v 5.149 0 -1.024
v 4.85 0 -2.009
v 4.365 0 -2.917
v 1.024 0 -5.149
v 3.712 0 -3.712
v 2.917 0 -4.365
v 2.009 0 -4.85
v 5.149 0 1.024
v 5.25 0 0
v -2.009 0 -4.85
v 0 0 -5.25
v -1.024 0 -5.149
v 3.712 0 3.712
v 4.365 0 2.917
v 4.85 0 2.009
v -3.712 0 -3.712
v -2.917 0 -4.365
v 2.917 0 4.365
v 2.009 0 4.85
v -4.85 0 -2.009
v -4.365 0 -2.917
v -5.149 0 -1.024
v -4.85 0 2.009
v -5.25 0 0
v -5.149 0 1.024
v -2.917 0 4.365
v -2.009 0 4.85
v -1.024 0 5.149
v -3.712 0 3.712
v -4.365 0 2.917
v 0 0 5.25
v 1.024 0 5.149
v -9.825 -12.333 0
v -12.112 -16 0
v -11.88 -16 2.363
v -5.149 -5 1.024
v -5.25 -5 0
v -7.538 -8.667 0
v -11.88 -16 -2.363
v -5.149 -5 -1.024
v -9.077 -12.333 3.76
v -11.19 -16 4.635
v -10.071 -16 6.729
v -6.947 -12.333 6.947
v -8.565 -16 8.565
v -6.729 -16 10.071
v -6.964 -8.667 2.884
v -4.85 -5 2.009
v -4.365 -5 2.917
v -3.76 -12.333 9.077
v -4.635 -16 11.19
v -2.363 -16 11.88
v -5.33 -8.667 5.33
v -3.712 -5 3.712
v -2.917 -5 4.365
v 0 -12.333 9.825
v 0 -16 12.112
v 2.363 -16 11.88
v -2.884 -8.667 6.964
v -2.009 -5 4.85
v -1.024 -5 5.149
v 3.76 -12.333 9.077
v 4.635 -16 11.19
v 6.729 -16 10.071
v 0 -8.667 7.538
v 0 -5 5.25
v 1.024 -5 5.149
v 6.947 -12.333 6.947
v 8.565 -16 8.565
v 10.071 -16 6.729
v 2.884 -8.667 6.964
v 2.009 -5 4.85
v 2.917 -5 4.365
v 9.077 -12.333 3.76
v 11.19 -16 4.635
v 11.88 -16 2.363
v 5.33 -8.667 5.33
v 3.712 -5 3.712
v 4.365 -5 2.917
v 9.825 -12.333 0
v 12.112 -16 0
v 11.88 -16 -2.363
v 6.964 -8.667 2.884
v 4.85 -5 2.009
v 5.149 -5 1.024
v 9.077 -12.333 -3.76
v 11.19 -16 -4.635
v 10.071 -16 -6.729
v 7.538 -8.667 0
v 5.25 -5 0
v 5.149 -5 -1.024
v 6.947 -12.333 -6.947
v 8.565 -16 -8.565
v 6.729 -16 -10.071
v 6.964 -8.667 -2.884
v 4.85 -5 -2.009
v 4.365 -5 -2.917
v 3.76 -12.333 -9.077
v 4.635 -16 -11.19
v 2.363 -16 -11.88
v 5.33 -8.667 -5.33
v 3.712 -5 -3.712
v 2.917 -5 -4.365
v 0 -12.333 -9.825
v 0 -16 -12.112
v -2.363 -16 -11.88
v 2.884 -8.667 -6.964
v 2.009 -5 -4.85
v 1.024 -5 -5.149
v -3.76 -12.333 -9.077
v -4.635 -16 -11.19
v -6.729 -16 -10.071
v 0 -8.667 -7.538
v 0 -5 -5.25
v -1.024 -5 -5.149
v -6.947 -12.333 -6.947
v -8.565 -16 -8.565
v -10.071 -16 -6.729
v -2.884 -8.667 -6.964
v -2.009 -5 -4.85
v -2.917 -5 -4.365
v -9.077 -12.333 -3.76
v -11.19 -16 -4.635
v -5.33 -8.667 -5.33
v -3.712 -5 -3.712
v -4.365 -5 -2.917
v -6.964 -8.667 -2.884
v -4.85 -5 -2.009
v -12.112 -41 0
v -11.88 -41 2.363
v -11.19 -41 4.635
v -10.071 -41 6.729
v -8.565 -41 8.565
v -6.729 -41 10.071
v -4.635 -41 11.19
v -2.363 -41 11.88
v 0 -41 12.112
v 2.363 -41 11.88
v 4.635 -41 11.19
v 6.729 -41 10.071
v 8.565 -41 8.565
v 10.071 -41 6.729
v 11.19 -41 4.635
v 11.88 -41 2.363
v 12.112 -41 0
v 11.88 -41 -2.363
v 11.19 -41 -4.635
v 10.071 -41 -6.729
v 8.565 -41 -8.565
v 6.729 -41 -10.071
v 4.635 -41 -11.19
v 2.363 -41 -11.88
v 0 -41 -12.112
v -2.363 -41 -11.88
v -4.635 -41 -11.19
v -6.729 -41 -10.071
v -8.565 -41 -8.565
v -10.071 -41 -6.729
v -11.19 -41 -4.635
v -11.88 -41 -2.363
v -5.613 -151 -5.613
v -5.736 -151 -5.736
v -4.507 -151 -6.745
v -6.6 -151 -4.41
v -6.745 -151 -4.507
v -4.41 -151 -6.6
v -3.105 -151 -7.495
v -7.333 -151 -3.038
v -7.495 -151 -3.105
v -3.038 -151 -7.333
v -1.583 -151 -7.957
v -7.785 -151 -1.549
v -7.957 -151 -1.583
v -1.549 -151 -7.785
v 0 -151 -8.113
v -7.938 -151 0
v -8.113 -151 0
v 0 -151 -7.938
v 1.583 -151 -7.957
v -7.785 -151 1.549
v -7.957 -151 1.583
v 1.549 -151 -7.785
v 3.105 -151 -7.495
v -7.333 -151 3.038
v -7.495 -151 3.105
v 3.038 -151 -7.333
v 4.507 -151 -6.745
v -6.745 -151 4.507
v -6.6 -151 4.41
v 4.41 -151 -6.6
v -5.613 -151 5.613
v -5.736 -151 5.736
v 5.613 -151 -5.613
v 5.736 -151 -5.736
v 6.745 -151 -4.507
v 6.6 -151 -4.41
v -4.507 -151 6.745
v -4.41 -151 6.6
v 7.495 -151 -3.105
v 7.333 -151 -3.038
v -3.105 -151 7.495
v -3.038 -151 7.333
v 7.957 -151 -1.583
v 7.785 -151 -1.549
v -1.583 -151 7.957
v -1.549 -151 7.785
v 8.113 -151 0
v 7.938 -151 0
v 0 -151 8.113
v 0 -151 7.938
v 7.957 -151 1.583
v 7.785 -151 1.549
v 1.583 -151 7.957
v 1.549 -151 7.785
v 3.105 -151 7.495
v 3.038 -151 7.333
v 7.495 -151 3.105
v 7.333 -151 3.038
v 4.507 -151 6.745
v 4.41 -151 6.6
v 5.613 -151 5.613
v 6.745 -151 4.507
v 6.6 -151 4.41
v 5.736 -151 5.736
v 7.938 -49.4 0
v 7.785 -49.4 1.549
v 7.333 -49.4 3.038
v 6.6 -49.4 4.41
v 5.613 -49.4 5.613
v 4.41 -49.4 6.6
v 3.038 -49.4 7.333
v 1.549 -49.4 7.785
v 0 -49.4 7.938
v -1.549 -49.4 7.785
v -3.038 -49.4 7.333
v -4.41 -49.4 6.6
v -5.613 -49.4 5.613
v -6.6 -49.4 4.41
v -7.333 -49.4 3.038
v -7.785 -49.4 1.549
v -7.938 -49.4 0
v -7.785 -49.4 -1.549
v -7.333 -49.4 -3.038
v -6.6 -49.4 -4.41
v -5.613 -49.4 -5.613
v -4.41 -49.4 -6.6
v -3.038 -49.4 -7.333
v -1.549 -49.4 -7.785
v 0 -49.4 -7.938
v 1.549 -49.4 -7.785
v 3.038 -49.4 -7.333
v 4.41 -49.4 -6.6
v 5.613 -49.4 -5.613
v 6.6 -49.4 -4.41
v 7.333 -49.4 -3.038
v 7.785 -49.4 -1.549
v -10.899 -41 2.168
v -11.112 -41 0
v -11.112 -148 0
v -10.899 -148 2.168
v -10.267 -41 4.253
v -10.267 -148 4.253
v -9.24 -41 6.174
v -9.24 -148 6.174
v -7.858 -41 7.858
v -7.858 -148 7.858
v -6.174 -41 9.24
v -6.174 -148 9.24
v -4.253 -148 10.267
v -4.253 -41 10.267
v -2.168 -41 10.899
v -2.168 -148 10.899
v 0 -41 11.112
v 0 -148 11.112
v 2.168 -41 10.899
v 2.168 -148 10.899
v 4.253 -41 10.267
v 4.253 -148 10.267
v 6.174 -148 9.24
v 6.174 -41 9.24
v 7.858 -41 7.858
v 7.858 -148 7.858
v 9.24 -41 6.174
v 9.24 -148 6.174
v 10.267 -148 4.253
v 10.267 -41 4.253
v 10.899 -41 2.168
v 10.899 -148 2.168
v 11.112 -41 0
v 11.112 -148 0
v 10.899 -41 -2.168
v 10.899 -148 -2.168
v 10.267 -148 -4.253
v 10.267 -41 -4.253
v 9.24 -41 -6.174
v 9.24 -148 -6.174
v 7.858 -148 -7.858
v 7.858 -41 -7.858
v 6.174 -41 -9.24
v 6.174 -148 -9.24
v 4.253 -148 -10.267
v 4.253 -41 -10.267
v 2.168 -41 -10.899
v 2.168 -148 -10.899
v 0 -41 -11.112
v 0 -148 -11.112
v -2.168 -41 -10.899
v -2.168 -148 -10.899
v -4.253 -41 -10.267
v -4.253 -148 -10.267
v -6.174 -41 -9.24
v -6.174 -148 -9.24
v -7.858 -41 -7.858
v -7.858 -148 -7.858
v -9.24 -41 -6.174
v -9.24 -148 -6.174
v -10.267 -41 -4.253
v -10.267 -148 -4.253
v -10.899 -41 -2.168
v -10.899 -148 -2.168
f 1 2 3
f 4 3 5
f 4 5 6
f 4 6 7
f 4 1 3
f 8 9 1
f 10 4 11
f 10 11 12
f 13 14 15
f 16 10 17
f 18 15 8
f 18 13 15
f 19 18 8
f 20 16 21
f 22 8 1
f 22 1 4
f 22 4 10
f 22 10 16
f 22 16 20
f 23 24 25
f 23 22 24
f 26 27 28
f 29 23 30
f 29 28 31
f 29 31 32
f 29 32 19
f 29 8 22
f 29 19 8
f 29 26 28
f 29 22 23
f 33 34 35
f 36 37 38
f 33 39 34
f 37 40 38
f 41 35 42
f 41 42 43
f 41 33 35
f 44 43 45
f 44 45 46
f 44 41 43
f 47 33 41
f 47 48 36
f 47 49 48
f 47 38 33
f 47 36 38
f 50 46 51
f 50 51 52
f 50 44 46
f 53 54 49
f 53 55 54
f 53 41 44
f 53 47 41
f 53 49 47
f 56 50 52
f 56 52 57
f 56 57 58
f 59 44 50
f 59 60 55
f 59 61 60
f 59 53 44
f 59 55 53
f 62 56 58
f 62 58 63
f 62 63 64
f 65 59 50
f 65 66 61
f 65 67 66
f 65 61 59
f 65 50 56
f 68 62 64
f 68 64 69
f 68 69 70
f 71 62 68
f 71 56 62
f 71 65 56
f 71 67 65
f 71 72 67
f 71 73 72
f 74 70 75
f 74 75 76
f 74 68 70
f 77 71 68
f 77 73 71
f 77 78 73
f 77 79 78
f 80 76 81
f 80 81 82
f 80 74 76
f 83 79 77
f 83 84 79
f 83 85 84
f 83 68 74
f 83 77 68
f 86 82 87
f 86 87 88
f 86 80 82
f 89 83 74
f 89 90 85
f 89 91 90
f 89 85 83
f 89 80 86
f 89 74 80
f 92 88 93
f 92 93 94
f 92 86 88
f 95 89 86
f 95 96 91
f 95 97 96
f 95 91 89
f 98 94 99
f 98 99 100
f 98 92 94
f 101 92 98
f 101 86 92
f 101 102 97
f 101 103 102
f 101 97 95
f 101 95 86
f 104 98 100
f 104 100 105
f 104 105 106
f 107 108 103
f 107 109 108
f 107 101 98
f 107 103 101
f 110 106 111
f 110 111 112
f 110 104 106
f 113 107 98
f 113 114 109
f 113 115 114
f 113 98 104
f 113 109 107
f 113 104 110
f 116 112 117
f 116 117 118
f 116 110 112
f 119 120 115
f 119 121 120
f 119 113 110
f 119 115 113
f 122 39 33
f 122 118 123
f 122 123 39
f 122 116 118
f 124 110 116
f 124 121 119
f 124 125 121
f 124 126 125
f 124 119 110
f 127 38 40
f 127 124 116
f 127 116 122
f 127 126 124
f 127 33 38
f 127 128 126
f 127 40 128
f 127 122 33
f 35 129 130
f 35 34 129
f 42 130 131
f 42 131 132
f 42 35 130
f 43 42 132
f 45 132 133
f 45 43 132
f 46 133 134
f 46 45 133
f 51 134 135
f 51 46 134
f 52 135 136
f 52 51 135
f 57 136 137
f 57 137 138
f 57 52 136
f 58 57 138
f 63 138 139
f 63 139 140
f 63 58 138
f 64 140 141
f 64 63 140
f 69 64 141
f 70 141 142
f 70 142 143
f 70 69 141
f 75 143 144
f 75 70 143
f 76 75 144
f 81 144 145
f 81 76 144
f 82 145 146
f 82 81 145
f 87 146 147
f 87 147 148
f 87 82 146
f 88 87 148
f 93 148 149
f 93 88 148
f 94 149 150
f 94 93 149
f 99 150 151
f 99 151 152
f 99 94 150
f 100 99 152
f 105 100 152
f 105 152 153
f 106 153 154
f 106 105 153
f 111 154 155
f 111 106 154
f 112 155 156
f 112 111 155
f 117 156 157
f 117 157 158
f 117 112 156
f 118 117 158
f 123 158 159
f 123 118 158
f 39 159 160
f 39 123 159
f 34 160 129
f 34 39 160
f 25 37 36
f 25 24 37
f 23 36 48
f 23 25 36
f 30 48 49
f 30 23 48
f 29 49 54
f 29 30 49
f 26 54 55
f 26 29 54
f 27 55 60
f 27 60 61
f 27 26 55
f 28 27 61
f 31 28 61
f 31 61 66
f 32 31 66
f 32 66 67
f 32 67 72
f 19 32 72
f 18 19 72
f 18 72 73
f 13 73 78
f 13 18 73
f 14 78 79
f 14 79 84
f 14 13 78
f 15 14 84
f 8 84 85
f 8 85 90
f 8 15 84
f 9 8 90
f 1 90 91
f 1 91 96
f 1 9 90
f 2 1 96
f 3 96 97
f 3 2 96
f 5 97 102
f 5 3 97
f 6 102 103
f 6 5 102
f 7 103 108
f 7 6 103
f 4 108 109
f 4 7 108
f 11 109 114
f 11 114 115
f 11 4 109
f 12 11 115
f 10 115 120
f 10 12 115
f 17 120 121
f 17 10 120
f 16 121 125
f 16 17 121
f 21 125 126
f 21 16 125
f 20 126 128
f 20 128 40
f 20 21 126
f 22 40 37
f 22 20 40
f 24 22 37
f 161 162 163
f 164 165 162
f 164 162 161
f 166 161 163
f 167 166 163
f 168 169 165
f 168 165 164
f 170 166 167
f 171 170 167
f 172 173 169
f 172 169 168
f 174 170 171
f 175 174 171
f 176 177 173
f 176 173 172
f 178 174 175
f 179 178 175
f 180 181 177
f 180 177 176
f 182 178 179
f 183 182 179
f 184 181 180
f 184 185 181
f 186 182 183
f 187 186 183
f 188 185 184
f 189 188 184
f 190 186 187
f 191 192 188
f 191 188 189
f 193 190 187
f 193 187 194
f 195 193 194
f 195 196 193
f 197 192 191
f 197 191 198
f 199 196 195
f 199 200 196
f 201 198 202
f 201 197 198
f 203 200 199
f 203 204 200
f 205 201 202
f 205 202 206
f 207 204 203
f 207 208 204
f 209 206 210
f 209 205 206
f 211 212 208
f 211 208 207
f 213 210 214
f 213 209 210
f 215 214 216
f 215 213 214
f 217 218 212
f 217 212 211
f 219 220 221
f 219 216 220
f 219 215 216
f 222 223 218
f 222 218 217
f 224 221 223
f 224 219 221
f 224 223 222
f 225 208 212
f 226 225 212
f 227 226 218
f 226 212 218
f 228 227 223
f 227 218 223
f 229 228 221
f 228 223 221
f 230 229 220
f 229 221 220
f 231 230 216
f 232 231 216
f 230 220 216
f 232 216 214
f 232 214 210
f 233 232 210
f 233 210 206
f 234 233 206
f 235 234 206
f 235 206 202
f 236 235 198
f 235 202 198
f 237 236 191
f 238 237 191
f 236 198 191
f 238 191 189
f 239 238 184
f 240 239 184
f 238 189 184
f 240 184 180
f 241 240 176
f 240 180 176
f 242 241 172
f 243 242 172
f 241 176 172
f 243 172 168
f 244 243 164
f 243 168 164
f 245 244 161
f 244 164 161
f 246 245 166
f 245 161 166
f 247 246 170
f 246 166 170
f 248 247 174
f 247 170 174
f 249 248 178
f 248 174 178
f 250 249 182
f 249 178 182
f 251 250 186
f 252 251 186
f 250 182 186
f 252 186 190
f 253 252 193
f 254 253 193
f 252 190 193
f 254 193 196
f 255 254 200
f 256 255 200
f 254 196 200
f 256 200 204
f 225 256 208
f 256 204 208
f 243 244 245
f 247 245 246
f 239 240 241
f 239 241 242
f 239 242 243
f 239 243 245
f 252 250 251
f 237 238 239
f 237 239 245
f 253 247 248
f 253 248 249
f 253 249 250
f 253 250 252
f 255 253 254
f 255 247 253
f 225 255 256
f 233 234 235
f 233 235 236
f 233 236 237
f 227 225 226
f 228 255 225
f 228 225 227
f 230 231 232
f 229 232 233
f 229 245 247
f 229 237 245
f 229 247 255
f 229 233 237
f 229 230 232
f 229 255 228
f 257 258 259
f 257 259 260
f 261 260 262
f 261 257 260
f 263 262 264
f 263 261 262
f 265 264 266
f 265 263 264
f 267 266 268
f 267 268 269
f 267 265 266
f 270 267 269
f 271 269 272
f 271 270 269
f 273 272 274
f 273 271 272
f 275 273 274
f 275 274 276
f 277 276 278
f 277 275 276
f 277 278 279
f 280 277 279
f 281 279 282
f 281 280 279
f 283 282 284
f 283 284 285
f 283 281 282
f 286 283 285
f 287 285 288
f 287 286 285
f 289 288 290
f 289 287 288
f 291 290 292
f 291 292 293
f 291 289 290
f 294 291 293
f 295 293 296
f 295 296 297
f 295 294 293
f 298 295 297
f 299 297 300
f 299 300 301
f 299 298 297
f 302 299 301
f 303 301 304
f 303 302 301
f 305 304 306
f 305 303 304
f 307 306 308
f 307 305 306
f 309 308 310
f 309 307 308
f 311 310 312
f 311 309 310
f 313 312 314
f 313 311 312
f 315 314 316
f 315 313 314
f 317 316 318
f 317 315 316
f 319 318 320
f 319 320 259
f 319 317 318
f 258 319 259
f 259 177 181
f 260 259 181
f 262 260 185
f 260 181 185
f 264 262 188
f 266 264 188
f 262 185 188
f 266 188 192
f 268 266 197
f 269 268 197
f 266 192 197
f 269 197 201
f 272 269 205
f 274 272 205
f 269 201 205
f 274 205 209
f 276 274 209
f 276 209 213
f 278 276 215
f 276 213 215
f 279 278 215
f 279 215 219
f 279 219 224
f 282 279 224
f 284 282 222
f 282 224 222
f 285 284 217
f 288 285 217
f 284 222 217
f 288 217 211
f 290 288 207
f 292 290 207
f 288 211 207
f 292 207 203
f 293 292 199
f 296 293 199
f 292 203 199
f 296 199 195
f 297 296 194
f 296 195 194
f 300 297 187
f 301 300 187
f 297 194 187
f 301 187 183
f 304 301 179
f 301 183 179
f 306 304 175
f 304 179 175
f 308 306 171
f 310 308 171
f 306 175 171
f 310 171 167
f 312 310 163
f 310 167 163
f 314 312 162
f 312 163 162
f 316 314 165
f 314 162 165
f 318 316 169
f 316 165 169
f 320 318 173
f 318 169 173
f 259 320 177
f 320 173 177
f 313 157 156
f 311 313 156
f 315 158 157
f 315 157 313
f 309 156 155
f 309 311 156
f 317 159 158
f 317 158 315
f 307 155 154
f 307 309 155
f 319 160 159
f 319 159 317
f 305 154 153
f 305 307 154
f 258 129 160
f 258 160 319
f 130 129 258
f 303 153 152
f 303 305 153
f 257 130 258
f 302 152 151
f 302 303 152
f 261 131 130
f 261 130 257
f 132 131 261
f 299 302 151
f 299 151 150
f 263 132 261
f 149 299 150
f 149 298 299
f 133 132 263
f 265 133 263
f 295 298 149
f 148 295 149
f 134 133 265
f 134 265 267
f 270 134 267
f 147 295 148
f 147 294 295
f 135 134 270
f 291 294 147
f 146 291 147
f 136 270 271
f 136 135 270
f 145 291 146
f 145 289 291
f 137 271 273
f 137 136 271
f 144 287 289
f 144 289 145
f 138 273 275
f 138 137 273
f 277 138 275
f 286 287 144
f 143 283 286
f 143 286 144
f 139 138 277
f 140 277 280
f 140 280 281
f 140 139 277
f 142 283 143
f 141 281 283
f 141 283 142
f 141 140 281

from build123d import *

# Parameters (mm, degrees)
SKETCH4_R          = 7.9375
CUT_EXTRUDE2_DEPTH = 101.6
CHAMFER2_SIZE      = 3


with BuildPart() as part:
    # Sketch3 → Revolve1 (revolve)
    with BuildSketch(Plane.XY):
        Polygon((-11.1125, -151), (-11.1125, -41), (-12.1125, -41), (-12.1125, -16), (-5.25, -5), (-5.25, 0), (0, 0), (0, -151), align=None)
    revolve(axis=Axis((0, -151, 0), (0, 1, 0)))

    # Sketch4 → Cut-Extrude2 (cut)
    with BuildSketch(Plane.XZ.offset(151)):
        Circle(SKETCH4_R)
    extrude(amount=-CUT_EXTRUDE2_DEPTH, mode=Mode.SUBTRACT)

    # Chamfer2
    chamfer2_edges = [part.edges().sort_by_distance(p)[0] for p in [
        (11.1125, -151, 0),
    ]]
    chamfer(chamfer2_edges, length=CHAMFER2_SIZE)


solid = part.part
